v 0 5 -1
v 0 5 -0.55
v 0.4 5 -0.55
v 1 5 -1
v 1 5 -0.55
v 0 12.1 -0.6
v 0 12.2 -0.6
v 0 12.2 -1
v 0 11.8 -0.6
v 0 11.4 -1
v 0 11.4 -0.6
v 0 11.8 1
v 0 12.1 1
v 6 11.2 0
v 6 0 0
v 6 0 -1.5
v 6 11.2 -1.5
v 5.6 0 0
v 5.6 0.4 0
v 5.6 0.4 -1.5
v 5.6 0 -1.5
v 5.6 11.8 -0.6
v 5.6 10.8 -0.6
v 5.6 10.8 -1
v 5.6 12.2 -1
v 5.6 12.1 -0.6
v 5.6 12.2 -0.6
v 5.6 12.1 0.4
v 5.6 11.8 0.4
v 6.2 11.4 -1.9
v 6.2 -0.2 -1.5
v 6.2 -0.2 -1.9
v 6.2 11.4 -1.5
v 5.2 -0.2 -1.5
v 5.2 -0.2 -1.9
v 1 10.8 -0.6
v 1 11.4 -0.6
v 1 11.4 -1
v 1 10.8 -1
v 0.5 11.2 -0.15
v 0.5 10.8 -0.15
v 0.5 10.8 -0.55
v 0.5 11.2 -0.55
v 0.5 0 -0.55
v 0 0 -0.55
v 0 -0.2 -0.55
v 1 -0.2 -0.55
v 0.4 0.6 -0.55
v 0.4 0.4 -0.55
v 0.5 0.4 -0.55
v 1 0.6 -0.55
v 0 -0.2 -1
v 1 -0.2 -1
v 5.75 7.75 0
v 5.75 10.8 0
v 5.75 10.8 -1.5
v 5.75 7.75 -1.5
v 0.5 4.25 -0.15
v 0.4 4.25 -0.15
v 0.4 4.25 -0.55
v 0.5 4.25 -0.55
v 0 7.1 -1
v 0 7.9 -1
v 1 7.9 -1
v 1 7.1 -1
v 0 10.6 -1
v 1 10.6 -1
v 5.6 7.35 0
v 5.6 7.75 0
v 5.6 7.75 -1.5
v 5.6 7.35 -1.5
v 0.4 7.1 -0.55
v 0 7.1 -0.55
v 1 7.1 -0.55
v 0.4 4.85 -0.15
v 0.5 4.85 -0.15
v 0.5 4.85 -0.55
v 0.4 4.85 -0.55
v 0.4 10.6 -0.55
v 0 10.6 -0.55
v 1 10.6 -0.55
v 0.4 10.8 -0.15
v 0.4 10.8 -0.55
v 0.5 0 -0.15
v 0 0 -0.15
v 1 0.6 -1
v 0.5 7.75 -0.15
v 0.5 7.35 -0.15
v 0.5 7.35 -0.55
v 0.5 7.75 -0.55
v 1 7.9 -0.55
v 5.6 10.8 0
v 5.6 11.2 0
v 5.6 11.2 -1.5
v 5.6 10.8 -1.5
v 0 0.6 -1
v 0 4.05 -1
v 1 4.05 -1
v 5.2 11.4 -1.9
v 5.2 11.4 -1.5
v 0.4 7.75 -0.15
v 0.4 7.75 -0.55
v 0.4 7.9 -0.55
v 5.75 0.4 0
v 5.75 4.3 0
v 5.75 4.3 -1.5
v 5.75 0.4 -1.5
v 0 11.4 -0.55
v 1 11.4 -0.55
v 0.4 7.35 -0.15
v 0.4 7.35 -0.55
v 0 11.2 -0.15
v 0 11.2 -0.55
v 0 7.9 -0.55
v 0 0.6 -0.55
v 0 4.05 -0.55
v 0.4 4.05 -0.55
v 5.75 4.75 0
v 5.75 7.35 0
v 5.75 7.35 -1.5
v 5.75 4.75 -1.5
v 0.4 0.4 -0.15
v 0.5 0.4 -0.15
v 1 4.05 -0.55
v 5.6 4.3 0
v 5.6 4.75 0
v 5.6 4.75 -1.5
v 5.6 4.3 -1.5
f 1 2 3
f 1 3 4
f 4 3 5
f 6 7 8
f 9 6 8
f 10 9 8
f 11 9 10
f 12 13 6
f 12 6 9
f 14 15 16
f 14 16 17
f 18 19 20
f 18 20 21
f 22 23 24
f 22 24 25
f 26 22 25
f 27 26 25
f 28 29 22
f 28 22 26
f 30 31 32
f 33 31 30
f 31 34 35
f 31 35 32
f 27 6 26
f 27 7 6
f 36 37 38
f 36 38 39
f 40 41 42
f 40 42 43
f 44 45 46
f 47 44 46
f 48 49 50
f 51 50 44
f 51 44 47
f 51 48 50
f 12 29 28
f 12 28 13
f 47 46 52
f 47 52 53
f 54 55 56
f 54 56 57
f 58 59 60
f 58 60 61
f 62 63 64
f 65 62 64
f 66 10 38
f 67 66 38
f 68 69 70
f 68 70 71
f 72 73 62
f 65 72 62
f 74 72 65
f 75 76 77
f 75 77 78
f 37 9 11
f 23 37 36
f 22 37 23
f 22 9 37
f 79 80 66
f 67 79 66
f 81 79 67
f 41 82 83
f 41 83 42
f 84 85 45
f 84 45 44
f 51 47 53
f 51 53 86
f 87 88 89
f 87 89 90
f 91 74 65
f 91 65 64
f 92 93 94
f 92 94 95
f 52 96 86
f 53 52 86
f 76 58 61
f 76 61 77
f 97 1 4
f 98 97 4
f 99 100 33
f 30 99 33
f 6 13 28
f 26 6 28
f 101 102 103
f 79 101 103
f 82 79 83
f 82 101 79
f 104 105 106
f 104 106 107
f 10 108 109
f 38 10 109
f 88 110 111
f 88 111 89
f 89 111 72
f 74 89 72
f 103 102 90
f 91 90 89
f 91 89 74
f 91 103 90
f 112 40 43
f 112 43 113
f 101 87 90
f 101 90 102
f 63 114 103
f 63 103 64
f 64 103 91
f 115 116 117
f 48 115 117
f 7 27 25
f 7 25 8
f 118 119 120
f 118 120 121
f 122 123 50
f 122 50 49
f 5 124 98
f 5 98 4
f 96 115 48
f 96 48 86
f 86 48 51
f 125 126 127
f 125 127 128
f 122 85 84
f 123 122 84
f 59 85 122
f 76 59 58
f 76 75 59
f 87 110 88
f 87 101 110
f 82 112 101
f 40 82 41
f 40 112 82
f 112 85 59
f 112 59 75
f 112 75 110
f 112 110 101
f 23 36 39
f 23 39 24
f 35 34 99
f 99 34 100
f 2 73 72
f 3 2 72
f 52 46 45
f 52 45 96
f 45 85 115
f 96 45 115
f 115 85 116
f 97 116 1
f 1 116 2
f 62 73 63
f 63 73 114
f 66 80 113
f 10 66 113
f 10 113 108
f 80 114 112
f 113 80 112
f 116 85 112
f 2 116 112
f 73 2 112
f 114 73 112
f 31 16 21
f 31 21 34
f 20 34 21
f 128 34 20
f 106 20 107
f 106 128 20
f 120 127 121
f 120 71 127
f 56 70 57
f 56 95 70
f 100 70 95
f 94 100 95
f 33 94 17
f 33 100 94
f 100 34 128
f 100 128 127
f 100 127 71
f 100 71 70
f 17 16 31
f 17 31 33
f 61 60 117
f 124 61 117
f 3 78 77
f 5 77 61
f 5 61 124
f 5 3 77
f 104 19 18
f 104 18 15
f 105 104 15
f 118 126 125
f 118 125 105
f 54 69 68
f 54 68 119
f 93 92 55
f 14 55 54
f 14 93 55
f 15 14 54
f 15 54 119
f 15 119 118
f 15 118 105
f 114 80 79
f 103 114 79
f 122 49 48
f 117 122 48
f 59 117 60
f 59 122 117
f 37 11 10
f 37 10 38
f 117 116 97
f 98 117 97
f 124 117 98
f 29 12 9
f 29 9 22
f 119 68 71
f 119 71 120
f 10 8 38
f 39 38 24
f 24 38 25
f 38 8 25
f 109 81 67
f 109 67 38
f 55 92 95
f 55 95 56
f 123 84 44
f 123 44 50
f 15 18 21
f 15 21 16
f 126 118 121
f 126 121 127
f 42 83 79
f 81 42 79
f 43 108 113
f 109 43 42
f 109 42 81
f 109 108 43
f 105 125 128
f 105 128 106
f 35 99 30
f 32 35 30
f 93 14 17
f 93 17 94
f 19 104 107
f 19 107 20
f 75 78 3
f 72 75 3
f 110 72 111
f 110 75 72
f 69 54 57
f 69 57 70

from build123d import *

# Parameters (mm, degrees)
F1_START = -0.15
F1_DEPTH = 0.4
F2_DEPTH = 1.5
F4_START = -0.55
F3_W     = 1
F3_H     = 0.7999996393
F3_H_2   = 0.95
F3_H_3   = 0.8
F4_DEPTH = 0.45
F5_START = -1.5
F3_H_4   = 11.6
F5_DEPTH = 0.4
F7_START = -0.6
F7_DEPTH = 0.4
F9_START = -1
F9_DEPTH = 0.3


with BuildPart() as f1:
    # F0 (on Top) → F1 (new body)
    with BuildSketch(Plane.XY.offset(F1_START)):
        Polygon((0, 11.2), (0, 0), (0.5, 0), (0.5, 0.4), (0.4, 0.4), (0.4, 4.25), (0.5, 4.25), (0.5, 4.85), (0.4, 4.85), (0.4, 7.35), (0.5, 7.35), (0.5, 7.75), (0.4, 7.75), (0.4, 10.8), (0.5, 10.8), (0.5, 11.2), align=None)
    extrude(amount=-F1_DEPTH)

    # F3 (on Top) → F4 (join)
    with BuildSketch(Plane.XY.offset(F4_START)):
        with Locations((0.5, 0.1999998196)):
            Rectangle(F3_W, F3_H)
        with Locations((0.5, 4.525)):
            Rectangle(F3_W, F3_H_2)
        with Locations((0.5, 7.5)):
            Rectangle(F3_W, F3_H_3)
        with Locations((0.5, 11)):
            Rectangle(F3_W, F3_H_3)
    extrude(amount=-F4_DEPTH)


with BuildPart() as f2:
    # F0 (on Top) → F2 (new body)
    with BuildSketch(Plane.XY):
        Polygon((5.6, 0.4), (5.6, 0), (6, 0), (6, 11.2), (5.6, 11.2), (5.6, 10.8), (5.75, 10.8), (5.75, 7.75), (5.6, 7.75), (5.6, 7.35), (5.75, 7.35), (5.75, 4.75), (5.6, 4.75), (5.6, 4.3), (5.75, 4.3), (5.75, 0.4), align=None)
    extrude(amount=-F2_DEPTH)

    # F3 (on Top) → F5 (join)
    with BuildSketch(Plane.XY.offset(F5_START)):
        with Locations((5.7, 5.6)):
            Rectangle(F3_W, F3_H_4)
    extrude(amount=-F5_DEPTH)


with BuildPart() as f7:
    # F6 (on Top) → F7 (new body)
    with BuildSketch(Plane.XY.offset(F7_START)):
        Polygon((1, 10.8), (5.6, 10.8), (5.6, 12.2), (0, 12.2), (0, 11.4), (1, 11.4), align=None)
    extrude(amount=-F7_DEPTH)

    # F8 (on face) → F9 (join)
    with BuildSketch(Plane.XZ.offset(-10.8).offset(F9_START)):
        Polygon((1, -0.6), (5.6, -0.6), (5.6, 0.4), (0, 1), (0, -0.6), align=None)
    extrude(amount=-F9_DEPTH)


solid = Compound([f1.part, f2.part, f7.part])
